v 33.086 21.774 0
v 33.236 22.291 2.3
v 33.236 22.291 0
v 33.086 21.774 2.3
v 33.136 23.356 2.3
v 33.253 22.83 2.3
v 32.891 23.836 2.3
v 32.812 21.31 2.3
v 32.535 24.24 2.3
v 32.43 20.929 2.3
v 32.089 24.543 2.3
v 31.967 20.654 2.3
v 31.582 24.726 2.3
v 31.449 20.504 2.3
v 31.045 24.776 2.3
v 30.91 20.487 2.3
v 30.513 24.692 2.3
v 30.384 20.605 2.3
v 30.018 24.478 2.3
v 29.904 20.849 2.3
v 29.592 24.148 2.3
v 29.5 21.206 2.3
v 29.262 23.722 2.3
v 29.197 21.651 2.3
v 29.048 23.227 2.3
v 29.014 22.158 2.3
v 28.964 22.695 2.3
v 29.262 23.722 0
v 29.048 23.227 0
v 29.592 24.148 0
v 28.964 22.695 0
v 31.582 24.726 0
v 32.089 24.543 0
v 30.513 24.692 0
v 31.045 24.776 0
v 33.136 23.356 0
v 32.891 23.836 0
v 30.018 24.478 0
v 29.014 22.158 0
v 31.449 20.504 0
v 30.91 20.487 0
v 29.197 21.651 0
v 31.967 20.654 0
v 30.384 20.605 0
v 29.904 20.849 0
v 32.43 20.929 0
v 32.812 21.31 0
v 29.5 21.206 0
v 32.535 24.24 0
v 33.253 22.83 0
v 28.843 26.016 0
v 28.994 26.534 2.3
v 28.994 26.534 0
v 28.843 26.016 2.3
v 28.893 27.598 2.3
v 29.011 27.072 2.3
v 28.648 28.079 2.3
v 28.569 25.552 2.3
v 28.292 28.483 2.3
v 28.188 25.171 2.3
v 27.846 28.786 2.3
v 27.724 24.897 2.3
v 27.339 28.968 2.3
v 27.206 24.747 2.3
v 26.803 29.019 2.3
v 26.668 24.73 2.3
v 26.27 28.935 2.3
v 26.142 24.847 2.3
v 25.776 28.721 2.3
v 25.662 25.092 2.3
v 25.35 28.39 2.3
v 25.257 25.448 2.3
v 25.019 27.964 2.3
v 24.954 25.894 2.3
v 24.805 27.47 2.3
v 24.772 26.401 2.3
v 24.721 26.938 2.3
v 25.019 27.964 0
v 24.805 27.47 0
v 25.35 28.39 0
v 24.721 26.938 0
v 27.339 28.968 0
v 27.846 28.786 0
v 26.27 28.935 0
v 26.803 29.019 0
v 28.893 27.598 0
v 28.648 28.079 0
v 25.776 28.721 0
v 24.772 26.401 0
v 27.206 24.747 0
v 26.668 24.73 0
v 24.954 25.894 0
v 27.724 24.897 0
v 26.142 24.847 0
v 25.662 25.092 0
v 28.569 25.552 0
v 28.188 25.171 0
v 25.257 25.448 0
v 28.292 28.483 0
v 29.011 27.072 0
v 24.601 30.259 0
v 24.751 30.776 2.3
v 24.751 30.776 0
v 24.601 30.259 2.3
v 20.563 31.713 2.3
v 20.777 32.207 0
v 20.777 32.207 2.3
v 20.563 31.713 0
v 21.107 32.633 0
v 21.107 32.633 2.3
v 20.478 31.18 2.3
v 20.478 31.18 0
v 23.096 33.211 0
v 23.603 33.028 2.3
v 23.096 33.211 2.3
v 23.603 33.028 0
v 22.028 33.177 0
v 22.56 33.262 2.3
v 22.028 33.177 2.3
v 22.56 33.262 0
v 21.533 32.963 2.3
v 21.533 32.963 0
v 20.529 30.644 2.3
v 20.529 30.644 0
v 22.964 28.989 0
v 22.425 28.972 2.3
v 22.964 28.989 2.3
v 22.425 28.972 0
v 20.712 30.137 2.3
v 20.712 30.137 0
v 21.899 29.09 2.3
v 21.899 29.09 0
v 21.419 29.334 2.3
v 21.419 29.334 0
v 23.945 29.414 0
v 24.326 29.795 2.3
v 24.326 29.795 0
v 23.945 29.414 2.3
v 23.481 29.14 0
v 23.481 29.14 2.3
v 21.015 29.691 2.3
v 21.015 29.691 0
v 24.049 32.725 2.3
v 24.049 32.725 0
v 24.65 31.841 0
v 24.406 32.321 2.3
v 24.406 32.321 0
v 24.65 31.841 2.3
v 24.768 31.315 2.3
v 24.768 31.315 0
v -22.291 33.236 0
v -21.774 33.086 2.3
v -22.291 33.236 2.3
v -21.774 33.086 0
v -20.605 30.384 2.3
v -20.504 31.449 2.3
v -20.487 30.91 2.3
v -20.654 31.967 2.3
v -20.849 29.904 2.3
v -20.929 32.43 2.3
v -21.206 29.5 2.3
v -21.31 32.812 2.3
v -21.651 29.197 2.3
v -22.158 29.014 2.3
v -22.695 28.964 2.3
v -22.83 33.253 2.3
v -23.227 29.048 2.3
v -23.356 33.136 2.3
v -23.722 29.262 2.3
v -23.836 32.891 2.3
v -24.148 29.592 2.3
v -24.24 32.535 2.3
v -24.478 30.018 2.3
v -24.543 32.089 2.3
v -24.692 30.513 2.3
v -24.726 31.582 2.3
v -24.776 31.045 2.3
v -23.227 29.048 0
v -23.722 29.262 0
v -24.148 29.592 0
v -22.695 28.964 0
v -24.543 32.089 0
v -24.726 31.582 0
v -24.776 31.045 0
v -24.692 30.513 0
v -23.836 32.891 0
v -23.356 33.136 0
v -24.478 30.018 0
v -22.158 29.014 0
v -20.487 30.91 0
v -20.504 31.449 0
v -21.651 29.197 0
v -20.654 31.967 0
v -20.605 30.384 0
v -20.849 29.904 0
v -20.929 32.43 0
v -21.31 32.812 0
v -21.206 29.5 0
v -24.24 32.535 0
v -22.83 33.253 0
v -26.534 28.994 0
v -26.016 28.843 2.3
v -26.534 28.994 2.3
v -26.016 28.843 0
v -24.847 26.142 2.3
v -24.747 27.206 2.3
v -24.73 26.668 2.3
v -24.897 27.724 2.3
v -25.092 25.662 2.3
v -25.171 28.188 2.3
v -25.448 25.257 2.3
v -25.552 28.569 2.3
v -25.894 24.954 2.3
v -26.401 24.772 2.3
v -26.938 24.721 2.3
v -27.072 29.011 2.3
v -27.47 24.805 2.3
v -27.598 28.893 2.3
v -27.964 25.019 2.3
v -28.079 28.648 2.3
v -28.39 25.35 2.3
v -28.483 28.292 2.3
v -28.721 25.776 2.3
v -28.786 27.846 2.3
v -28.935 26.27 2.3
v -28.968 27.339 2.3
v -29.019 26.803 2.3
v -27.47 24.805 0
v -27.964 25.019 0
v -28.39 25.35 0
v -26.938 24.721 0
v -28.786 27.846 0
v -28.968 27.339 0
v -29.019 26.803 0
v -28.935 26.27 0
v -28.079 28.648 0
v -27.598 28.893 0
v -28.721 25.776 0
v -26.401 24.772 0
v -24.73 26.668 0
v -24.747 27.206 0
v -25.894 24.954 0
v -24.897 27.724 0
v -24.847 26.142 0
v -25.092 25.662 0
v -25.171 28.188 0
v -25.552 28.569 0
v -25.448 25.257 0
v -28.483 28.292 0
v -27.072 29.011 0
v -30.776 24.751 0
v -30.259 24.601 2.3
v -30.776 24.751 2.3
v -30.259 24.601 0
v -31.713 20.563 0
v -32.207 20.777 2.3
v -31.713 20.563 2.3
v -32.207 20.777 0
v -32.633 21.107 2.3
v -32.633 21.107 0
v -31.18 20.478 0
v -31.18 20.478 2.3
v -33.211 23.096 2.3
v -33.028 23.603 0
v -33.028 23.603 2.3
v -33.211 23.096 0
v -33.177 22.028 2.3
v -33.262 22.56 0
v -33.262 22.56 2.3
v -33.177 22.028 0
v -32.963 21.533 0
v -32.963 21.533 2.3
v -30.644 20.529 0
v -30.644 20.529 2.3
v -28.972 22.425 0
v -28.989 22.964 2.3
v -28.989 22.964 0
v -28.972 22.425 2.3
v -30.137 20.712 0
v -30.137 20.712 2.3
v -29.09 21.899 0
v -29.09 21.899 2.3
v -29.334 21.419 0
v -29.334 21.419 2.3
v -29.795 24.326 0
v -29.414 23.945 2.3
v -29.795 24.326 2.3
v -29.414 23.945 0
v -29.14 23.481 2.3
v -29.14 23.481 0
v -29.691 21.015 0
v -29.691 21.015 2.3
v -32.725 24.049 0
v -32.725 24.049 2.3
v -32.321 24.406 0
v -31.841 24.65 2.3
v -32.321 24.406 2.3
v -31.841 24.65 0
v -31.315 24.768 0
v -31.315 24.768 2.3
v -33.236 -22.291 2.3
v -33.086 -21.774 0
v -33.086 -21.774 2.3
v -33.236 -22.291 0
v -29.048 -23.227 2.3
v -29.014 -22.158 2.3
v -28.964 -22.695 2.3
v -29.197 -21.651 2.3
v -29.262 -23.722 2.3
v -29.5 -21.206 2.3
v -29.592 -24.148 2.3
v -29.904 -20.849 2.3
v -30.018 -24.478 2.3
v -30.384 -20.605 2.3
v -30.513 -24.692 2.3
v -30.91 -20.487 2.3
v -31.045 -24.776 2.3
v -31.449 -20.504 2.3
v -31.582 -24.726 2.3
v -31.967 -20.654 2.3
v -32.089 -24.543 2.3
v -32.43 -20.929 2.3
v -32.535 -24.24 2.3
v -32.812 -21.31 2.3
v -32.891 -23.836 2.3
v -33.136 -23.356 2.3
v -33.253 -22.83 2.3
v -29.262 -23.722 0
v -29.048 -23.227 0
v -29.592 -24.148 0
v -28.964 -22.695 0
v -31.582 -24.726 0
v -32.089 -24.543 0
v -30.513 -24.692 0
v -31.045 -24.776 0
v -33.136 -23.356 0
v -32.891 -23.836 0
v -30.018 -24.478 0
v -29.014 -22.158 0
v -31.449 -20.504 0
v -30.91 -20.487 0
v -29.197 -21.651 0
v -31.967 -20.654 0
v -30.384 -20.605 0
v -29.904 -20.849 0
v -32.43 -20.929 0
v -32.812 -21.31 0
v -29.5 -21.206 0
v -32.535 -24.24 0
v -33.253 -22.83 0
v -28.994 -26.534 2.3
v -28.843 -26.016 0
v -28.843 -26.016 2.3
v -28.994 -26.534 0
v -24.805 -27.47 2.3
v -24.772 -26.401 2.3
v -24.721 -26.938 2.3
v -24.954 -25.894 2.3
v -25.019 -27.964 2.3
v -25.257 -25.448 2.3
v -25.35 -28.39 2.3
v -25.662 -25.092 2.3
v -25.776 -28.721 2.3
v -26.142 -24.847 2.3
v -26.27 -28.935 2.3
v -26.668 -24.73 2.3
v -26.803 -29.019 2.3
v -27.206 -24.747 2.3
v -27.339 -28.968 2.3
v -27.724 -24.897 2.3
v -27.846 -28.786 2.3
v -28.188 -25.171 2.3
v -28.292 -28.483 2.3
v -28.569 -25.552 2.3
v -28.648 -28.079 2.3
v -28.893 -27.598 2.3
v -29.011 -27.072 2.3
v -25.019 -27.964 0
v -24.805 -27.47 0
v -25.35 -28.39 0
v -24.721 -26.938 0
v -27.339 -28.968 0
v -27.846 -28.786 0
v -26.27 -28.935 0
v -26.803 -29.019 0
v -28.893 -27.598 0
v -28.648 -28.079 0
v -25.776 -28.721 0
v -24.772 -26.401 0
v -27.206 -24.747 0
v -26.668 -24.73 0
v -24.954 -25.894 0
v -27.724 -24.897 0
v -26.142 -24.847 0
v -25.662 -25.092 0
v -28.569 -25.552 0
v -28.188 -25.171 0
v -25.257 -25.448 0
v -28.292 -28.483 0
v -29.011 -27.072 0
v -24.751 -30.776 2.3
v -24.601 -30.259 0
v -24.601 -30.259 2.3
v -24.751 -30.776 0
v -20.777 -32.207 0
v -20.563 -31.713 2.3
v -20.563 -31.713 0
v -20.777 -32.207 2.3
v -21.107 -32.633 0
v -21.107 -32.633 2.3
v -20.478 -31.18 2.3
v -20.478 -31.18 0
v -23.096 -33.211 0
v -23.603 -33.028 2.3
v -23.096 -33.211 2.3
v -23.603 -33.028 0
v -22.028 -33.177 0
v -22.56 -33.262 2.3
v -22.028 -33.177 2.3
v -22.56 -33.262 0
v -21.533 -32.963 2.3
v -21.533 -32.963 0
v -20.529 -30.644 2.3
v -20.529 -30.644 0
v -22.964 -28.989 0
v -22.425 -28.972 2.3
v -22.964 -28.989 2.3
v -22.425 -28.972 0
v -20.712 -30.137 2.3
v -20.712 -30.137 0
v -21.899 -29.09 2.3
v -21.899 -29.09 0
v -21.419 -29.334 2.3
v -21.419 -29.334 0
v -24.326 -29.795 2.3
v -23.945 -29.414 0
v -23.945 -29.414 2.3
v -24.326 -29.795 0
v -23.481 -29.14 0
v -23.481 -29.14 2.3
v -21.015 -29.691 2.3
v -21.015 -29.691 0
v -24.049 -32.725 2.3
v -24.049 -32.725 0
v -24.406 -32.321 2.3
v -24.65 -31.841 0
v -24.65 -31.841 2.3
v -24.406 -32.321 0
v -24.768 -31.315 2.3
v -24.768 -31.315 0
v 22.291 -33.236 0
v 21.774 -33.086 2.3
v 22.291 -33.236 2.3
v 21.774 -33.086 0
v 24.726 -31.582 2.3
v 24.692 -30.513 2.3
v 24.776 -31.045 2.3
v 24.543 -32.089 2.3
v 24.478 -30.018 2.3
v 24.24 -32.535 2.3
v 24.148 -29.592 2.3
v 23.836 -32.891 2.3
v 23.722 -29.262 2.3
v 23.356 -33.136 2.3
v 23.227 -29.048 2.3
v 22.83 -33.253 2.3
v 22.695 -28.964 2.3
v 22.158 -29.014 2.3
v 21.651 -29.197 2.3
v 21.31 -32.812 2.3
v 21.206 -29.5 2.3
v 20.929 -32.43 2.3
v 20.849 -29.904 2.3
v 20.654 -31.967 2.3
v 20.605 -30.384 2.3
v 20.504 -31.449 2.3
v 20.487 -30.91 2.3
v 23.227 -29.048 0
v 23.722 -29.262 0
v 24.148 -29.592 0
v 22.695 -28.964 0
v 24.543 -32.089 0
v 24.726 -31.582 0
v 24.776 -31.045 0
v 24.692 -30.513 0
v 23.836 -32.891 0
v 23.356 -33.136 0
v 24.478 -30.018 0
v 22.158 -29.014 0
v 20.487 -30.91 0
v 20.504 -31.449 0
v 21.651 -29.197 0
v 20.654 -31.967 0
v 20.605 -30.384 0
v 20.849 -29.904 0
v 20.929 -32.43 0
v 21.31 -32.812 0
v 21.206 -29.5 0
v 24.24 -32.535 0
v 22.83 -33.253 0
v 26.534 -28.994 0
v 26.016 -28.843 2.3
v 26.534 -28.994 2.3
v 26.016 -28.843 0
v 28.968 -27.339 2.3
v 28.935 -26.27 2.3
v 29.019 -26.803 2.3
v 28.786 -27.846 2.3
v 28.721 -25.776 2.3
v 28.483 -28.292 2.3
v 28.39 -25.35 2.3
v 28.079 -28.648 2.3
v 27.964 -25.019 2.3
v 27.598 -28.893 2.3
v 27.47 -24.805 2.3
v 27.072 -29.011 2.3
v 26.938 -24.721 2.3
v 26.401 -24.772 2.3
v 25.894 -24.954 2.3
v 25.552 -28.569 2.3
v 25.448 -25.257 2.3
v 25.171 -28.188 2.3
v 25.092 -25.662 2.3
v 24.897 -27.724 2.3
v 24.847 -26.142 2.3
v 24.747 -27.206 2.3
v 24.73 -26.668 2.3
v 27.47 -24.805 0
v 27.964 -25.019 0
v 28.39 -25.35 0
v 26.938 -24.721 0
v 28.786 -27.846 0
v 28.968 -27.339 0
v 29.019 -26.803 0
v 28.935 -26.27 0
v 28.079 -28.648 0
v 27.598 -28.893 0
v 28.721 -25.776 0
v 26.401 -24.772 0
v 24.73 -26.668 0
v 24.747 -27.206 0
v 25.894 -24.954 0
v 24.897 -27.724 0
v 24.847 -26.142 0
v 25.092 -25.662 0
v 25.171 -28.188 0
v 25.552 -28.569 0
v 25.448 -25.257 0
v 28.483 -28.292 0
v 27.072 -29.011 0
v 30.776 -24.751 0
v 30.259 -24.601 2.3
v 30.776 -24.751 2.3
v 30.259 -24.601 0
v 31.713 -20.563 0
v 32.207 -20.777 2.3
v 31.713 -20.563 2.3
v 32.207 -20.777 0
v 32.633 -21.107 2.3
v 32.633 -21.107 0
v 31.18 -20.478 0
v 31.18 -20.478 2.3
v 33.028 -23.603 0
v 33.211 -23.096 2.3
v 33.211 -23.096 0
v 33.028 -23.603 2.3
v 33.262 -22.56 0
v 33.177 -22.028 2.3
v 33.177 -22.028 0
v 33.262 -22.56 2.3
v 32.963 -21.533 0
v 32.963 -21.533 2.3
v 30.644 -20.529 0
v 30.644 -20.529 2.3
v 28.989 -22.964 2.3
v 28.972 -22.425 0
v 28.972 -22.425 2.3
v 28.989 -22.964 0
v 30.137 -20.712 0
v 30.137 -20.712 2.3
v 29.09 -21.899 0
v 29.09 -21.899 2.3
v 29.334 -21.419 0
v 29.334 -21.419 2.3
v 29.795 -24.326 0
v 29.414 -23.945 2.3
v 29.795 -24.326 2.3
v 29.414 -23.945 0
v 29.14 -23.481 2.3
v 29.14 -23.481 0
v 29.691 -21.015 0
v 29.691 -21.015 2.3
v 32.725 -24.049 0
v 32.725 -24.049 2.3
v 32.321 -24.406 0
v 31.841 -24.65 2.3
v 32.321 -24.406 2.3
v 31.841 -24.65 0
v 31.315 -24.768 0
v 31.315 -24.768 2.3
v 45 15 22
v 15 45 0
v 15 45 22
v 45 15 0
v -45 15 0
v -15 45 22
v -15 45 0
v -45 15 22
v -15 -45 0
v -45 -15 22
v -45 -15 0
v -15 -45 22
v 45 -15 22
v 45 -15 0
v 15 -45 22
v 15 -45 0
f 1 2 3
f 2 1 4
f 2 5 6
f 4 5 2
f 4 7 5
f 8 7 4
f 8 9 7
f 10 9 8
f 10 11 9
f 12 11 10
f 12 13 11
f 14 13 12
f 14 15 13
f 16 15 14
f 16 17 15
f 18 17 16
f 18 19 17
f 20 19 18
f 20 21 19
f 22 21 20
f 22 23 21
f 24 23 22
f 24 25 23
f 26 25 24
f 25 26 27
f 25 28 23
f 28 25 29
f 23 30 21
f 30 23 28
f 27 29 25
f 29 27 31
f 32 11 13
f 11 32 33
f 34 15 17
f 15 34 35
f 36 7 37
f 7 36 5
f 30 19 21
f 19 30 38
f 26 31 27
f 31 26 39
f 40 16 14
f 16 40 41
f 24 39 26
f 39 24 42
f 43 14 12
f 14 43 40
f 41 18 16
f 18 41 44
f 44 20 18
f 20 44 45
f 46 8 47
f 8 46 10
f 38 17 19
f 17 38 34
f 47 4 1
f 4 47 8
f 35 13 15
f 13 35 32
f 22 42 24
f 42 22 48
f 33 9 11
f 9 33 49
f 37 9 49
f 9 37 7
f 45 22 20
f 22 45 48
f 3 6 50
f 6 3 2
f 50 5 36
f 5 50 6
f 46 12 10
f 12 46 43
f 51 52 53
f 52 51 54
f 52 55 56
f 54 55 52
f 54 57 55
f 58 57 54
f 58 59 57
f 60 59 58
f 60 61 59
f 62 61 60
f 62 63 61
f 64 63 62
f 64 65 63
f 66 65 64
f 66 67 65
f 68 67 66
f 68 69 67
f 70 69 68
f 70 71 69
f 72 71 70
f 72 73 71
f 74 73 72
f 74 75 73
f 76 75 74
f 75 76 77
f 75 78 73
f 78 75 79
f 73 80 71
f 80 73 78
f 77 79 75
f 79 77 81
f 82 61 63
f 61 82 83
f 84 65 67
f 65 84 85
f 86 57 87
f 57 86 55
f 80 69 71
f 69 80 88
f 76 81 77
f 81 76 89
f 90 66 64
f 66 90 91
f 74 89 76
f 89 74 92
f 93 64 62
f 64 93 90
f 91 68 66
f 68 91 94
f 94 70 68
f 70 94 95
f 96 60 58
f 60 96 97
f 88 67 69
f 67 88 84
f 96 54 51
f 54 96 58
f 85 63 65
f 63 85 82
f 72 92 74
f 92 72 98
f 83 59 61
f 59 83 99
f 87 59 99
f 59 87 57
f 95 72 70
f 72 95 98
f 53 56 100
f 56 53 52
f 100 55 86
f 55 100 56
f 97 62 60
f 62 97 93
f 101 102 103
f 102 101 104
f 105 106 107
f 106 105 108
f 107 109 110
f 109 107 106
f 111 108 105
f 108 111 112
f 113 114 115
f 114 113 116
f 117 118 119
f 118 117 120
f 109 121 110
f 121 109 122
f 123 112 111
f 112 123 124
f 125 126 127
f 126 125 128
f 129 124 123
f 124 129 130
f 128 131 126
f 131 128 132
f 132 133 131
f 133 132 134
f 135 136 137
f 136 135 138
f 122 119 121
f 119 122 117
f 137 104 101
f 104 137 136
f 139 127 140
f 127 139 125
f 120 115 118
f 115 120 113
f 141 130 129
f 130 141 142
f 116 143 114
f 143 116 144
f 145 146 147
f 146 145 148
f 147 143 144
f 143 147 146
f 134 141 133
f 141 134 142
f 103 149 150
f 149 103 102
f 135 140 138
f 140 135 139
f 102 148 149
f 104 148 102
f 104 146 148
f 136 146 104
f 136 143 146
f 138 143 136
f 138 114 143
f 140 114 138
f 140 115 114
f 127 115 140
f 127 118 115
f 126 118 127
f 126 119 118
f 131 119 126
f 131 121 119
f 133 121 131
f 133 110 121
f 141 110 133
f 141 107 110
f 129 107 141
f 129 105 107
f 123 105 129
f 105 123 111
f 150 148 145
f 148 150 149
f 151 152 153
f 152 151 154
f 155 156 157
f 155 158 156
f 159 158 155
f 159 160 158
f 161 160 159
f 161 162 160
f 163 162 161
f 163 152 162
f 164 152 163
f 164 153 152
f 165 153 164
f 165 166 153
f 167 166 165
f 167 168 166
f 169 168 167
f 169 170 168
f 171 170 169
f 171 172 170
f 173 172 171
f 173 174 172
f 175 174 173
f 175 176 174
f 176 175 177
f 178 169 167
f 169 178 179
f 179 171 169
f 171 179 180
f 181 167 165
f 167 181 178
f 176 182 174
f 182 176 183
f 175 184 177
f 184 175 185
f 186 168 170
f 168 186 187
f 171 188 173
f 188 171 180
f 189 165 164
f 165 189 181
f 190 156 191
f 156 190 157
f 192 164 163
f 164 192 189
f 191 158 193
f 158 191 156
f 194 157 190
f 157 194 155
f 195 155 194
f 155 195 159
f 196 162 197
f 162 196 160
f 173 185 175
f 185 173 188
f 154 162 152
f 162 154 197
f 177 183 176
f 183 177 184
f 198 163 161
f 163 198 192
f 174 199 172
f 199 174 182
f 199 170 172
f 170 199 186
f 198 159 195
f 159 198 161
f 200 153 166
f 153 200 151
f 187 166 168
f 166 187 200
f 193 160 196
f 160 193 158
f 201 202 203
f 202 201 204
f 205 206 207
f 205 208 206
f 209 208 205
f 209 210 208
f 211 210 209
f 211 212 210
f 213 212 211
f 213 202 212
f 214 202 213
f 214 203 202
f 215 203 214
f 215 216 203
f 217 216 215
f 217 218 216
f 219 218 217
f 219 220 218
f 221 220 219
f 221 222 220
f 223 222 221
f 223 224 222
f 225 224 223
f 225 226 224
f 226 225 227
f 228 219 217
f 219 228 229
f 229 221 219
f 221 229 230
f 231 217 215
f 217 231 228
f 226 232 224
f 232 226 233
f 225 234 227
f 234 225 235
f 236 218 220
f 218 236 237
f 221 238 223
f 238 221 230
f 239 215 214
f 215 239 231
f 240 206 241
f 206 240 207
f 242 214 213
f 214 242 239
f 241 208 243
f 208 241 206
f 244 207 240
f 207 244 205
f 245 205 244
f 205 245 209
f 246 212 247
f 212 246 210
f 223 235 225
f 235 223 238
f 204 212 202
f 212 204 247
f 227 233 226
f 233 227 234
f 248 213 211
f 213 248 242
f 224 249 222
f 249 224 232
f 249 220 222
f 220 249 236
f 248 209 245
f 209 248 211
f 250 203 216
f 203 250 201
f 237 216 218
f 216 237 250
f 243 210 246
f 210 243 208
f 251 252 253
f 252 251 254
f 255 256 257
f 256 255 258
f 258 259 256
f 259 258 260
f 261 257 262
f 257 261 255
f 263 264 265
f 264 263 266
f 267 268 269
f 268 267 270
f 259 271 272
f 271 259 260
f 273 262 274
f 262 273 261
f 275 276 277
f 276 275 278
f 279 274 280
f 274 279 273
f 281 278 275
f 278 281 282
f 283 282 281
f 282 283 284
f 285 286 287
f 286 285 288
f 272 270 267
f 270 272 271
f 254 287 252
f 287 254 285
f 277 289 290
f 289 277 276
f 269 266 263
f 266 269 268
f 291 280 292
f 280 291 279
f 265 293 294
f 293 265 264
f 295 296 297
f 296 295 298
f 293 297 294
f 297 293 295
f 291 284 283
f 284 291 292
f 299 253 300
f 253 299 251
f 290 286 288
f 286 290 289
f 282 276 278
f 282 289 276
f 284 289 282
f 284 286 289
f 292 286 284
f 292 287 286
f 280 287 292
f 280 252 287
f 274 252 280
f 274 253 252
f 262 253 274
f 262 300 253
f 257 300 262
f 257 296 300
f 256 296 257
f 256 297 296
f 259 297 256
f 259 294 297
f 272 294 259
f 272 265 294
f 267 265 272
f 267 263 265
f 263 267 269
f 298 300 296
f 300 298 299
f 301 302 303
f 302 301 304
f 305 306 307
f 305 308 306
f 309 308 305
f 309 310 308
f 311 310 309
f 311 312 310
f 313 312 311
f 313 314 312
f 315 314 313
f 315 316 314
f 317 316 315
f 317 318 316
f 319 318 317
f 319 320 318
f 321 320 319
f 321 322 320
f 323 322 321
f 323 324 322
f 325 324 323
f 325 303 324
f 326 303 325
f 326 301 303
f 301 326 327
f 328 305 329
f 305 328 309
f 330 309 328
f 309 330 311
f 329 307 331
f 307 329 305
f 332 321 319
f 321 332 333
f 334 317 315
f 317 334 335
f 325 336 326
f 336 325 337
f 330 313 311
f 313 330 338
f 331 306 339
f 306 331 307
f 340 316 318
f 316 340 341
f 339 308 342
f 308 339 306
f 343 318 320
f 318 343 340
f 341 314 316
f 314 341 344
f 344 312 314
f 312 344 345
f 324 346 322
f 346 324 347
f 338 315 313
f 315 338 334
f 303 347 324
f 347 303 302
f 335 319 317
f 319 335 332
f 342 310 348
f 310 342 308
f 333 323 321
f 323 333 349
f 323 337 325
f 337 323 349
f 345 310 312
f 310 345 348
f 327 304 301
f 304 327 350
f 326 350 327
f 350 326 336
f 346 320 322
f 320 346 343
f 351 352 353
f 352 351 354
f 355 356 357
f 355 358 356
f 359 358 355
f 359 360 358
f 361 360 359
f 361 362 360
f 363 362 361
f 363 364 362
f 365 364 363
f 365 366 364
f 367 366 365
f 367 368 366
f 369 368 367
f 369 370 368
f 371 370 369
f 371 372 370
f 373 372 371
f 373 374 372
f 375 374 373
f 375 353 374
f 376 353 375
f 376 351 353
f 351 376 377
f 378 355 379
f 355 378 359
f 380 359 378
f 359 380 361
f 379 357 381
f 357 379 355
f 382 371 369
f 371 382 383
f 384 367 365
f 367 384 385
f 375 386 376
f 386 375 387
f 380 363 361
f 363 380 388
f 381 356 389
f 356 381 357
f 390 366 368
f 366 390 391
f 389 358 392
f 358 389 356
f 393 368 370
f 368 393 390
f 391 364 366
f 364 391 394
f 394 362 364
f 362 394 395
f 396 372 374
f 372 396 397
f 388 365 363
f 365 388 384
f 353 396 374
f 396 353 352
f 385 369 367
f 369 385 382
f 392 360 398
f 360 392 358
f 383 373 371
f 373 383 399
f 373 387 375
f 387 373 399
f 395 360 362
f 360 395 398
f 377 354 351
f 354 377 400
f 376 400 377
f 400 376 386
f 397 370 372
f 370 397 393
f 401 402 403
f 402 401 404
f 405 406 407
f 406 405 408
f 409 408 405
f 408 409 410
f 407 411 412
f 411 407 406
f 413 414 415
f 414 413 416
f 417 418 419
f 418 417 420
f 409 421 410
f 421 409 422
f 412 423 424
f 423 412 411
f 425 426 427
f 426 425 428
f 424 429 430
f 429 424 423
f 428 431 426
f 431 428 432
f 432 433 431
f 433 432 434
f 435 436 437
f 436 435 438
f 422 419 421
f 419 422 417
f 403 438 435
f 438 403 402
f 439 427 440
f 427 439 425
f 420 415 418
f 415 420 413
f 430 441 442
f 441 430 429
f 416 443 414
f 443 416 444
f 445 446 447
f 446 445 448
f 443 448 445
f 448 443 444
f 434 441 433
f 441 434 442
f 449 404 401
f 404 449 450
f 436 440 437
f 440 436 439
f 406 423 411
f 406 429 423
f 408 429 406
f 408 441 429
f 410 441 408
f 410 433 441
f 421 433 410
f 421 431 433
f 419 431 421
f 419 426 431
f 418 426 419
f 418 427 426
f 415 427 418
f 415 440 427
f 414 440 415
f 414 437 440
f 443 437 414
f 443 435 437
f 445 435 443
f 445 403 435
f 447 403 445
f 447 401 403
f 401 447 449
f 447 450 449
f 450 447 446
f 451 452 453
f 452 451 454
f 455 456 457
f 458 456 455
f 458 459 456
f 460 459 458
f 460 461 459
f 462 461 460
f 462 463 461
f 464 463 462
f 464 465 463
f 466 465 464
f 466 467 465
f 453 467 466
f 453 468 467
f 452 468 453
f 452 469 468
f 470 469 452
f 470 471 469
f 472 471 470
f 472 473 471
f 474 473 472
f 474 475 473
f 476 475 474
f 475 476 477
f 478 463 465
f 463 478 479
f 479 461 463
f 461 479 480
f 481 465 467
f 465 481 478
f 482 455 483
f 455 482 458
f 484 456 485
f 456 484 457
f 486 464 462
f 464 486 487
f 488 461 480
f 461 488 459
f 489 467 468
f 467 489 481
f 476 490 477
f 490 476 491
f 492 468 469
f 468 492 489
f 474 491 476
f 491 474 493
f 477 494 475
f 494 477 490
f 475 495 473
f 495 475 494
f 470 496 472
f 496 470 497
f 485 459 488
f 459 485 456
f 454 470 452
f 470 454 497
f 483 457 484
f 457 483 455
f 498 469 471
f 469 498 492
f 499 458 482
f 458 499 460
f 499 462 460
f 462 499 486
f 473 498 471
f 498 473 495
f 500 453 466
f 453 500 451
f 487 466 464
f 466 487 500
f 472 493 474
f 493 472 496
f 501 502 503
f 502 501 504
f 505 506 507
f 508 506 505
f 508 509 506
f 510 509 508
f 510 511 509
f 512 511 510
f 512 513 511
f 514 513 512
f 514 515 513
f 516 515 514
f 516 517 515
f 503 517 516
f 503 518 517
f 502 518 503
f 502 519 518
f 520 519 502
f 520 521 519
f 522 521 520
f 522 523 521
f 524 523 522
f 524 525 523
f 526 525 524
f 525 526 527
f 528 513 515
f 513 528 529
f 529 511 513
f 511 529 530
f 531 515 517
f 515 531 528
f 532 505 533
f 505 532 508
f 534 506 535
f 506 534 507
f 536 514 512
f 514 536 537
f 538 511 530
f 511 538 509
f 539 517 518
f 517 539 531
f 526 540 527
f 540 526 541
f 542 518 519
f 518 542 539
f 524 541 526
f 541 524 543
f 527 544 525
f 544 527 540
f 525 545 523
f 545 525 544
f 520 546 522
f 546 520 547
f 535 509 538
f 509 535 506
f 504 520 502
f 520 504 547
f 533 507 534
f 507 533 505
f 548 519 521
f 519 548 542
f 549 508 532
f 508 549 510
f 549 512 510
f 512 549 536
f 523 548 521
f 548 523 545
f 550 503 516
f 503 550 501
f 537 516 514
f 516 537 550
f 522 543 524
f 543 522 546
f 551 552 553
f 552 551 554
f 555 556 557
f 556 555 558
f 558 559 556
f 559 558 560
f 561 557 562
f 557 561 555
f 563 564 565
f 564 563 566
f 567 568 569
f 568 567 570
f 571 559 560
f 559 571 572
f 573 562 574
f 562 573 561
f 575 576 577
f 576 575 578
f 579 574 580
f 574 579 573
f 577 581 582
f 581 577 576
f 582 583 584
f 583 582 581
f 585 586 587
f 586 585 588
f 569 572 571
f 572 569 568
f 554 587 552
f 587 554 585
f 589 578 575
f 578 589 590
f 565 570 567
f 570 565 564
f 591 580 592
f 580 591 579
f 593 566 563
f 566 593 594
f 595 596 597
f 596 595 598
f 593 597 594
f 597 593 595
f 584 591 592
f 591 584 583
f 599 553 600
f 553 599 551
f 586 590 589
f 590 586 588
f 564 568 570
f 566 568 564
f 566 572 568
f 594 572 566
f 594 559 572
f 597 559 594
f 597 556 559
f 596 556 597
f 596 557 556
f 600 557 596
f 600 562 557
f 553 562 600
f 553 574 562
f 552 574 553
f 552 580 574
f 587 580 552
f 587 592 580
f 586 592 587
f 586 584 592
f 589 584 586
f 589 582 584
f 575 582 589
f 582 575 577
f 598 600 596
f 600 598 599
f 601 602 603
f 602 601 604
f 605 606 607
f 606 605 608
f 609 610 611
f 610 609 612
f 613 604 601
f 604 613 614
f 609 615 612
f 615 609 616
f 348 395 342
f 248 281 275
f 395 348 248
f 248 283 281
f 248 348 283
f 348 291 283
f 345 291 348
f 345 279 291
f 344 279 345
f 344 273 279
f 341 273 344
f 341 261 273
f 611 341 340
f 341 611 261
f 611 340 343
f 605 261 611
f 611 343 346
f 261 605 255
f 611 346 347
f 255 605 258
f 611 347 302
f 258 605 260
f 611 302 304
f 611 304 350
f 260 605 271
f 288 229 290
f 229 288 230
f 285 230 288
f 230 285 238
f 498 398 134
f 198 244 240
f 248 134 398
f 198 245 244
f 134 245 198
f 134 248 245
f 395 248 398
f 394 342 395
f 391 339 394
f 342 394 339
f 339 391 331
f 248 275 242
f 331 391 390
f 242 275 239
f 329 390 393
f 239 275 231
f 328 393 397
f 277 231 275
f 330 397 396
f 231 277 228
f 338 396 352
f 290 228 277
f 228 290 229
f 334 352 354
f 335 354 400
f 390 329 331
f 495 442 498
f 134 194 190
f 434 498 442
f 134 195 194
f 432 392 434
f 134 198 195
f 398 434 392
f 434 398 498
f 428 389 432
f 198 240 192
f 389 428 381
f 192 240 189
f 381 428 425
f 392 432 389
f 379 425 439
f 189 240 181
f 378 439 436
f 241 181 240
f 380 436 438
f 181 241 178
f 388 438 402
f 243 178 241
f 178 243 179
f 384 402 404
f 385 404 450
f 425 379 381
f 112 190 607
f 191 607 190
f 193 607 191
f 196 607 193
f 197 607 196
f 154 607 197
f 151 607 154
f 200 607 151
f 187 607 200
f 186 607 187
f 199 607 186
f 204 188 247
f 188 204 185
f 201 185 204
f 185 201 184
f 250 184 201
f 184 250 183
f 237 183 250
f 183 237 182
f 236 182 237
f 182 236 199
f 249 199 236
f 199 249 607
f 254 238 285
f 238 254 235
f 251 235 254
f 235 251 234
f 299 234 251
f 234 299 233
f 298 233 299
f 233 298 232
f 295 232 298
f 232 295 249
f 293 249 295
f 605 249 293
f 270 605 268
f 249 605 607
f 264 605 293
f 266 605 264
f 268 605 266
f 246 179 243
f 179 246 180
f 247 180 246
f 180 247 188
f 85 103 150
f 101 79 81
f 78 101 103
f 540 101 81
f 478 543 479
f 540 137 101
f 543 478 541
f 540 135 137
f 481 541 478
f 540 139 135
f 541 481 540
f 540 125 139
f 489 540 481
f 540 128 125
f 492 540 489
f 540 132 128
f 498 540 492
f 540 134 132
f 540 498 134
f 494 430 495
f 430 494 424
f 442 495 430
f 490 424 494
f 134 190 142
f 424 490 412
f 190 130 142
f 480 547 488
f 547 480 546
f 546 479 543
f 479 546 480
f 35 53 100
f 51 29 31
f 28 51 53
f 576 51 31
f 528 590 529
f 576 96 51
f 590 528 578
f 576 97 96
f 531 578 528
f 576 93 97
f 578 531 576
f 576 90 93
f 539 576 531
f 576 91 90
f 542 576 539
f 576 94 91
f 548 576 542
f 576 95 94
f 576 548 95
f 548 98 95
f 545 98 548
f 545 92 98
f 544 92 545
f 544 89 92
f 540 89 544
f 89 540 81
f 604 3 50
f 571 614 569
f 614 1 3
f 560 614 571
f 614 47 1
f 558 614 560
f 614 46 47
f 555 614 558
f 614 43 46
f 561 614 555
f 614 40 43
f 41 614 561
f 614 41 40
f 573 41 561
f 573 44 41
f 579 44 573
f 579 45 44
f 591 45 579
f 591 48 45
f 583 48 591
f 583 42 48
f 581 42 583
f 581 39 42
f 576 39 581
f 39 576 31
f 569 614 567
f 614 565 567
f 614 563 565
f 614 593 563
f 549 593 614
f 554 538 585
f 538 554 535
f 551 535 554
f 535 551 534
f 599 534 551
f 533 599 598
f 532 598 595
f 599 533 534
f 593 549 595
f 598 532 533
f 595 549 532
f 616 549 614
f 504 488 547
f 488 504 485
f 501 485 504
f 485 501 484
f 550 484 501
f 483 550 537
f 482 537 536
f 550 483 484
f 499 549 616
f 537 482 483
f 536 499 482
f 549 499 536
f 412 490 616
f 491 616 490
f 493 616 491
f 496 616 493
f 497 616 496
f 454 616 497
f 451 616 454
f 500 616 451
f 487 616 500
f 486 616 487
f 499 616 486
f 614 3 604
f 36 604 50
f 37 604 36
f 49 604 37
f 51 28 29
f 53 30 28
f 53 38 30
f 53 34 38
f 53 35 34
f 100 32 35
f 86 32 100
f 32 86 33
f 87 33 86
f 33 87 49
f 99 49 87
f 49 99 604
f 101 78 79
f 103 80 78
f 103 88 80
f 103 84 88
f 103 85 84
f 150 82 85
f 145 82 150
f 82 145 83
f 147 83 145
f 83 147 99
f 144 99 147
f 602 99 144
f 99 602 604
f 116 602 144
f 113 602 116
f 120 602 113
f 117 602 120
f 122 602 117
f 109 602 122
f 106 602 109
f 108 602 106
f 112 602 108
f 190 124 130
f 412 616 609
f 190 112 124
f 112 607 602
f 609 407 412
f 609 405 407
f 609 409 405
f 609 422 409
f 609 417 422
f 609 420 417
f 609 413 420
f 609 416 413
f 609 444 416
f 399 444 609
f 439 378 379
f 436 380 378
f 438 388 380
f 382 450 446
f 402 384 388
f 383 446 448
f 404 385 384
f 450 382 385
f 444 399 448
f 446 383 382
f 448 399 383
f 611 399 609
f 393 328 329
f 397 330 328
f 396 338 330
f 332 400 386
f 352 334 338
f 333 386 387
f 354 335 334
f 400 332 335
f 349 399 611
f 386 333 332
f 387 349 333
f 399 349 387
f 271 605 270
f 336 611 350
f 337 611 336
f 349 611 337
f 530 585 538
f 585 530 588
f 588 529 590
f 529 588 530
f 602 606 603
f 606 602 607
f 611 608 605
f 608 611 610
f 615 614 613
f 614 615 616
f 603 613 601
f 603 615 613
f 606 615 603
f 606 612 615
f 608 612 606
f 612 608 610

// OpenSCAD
// file: ../../util/rounded.scad
// Do a rounded cube
module rounded(x=10, y=10, z=10, r=3, center=false) {
  if (center) {
    translate([-(x/2),-(y/2),0])
      rounded(x, y, z, r);
  } else {
    translate([r,r,0])
    minkowski() {
      cube([x-2*r,y-2*r,z/2]);
      cylinder(h=z/2, r=r);
    }
  }
}
// file: ../../util/hole3.scad
module hole3()
{
    cylinder(d=3.5, h=99, center=true);
}
// file: ../../util/repeat4.scad
module repeat4()
{
    for (r=[0:3])
    rotate([0,0,90*r])
    children();
}
// file: ../../util/hexapath.scad
// Follow an hexagonal path
module hexapath(X, Y, thickness, center=false)
{
    union() {
        linear_extrude(thickness, center=center)
            polygon(points=[
                    [X, Y], [X, -Y], 
                    [Y, -X], [-Y, -X],
                    [-X, -Y], [-X, Y],
                    [-Y, X], [Y, X], 
            ]);
    }
}
// file: ../../models/ollo.scad
// Diameter of plastic ollo holes
OlloHoles = 4.3;

// Width of Ollo "real" plastic
OlloWidth = 3;

// Distance between two ollo holes
OlloSpacing = 6;

// Do an Ollo hole on the part
module olloHole(depth=2.2)
{
    translate([0,0,-0.1])
      cylinder(depth+0.2, OlloHoles/2, OlloHoles/2);
}

// Do 3 ollo holes
module threeOllo(depth=2.2)
{
  for (xy=[[-OlloSpacing,0],[0,0],[OlloSpacing,0]]) {
    translate([xy[0], xy[1], 0])
    olloHole(depth);
  }
}

// Do a servo arm holes
module servoArm(depth=2.2)
{
    threeOllo(depth);
    rotate([0,0,90])
      threeOllo(depth);
}
// file: ../../parts/batfix.scad
include <../models/ollo.scad>;
use <../util/rounded.scad>;
use <../util/screws.scad>;

module batfix(thickness=2.2, cavity=13, height=10, screws=3.2,print=false)
{
	shift=9;
	holesSpacingW = OlloSpacing*7;
	holesSpacingH = OlloSpacing*2;
	R=print?[90,0,0]:[0,0,0];
	translate([-shift,0,height-2*thickness])
	rotate(R)
	difference() {
		union() {
			rounded(50, 20, thickness, 2, center=true);
			translate([shift,0,thickness-height/2])
			cube([cavity+2*thickness,20,height], center=true);
		}
		
		for (X=[-holesSpacingW/2, holesSpacingW/2])
		for (Y=[-holesSpacingH/2, holesSpacingH/2])
		translate([X,Y,-1])			
			cylinder(d=screws, h=thickness+2);
		
		translate([shift,0,0.01+2*thickness-height/2])
			cube([cavity,22,height], center=true);
		
		translate([shift,0,thickness-height])
			children();
	}
}

batfix();
// file: ../../parts/leg.scad
use <../models/ollo.scad>;
use <../util/rounded.scad>;

module leg(sizeA=60, sizeB=20, sizeC=20, sizeBottom=10,
        sizeTop=15, mode="arm", fixationAngle=0, thickness=2.2, print=false)
{
    xOffset = (mode == "side") ? -10 : 0;
    spacing = (mode == "side") ? 24 : 30;

    module legSide()
    {
        difference() {
            union() {
                translate([0,0,sizeA/2])
                    rotate([0,90,0]) {
                        cube([sizeA, 20, thickness], center=true);
                        if (mode == "side") {
                            translate([15-sizeA/2, 10, -thickness/2])
                                rotate([0,0,+fixationAngle])
                                rounded(25,10,thickness, center=true);
                        }
                    }
            }
            translate([-thickness, 0, sizeA-15]) {
                rotate([90,0,90]) {
                    if (mode == "arm") {
                        servoArm(2*thickness);
                    }
                }
                if (mode == "side") {
                    translate([0,10,0])
                        rotate([90,90-fixationAngle,90])
                        threeOllo(2*thickness);
                }
            }
        }
        translate([-thickness/2,0,sizeA]) {
            rotate([90,0,90])
                linear_extrude(thickness)
                polygon([[-10,0],[-1,sizeTop],[1,sizeTop],[10,0]]);
        }
    }

    module biais() {
        Dx = (spacing-sizeBottom)/2;
        Dy = sizeC;
        Dl = sqrt(pow(Dx,2)+pow(Dy,2));

        translate([-(spacing/2)-thickness,-10,-(sizeB+thickness/2)])
            rotate([0,atan2(Dy,Dx),0])
            cube([Dl,20,thickness]);
    }

    if (print) {
        translate([0,0,10-xOffset])
            rotate([90,0,0])
            leg(sizeA, sizeB, sizeC, sizeBottom,
                    sizeTop, mode, fixationAngle, thickness, false);
    } else {
        echo("[PART] leg");
        translate([0,xOffset,-sizeA+15]) {
            cube([spacing+thickness*2, 20, thickness], center=true);

            translate([spacing/2+thickness/2,0,0])
                legSide();
            translate([-(spacing/2+thickness/2),0,0])
                legSide();

            translate([0,0,-sizeB])
                cube([spacing+thickness*2, 20, thickness], center=true);
            translate([spacing/2+thickness/2,0,-sizeB/2])
                cube([thickness,20,sizeB], center=true);
            translate([-(spacing/2+thickness/2),0,-sizeB/2])
                cube([thickness,20,sizeB], center=true);

            translate([0,0,-(sizeB+sizeC)])
                cube([sizeBottom+thickness*2, 20, thickness], center=true);

            biais();
            mirror([1,0,0]) {
                biais();
            }
        }
    }
}

leg();
// file: ../../parts/side.scad
include <../models/ollo.scad>;
use <../util/rounded.scad>;

module side(size=40, holesToBorder=5, thickness=2.2, print=false) {
    if (print) {
        translate([0,-size+holesToBorder,0])
            side(size,holesToBorder,thickness,false);
    } else {
        echo("[PART] side");
        translate([0,size-holesToBorder,0]) {
            difference() {
                rounded(20, size*2, thickness, 5, true);
                for (y=[size-holesToBorder,	 -size+holesToBorder,
                        size-holesToBorder-3*OlloSpacing, -size+holesToBorder+3*OlloSpacing]) {
                    translate([0, y, 0])
                        threeOllo();
                }
            }
        }
    }
}

side();
// file: ../../parts/u.scad
use <../models/ollo.scad>;

module u(height=15, radius=8, thickness=2.2, screwsSpacing=10, screwsDiameter=2.6, screws=true, olloScrew=false, widthSize=15, print=false) {
    module Ubranch() {
        union() {  
            cylinder(thickness, 10, 10);
            translate([-10,0,0])
                cube([20, height, thickness]);
        }
    }

    module USide() {
        difference() {
            union() {
                Ubranch();
                translate([-10,height+radius-thickness,radius])
                    cube([20,thickness,widthSize-(radius-thickness)]);
                translate([-10,height,radius]) {
                    rotate([0,90,0]) {
                        difference() {
                            cylinder(20,radius,radius);
                            translate([0,0,-1])
                                cylinder(22,radius-thickness,radius-thickness);
                            translate([-10+radius-thickness,-10,-1])
                                cube([10,10,22]);
                            translate([-10,-20+radius-thickness,-1])
                                cube([10,20.01,22]);
                        }
                    }
                }
            }
            servoArm(depth=6);
        }
    }

    module UScrews() {
        for (x=[-screwsSpacing/2,screwsSpacing/2]) {
            for (y=[-screwsSpacing/2,screwsSpacing/2]) {
                rotate([270,0,0])
                    translate([x,y,0])
                    cylinder(d=screwsDiameter, h=100);
            }
        }
    }

	module UOllo() {
		rotate(-90, [1,0,0])
			servoArm(2*height);
	}

    if (print) {
        translate([0,0,10])
            rotate([0,90,0])
            u(height,radius,thickness,screwsSpacing,screwsDiameter,
                screws,olloScrew,widthSize,false);
    } else {
        echo("[PART] u");
        difference() {
            translate([0,0,-widthSize-thickness]) {
                USide();
                mirror([0,0,1]) translate([0,0,-2*thickness-2*widthSize])  
                    USide();
            }
            if (screws) {
                UScrews();
            }
            if (olloScrew) {
                UOllo();
            }
        }
    }
}

u();
// file: ../../parts/body.scad
use <../models/ollo.scad>;
use <../util/hexapath.scad>;
use <../util/repeat4.scad>;
use <../util/hole3.scad>;

$fn=25;

module body(thickness=2.2, type="top", print=false) {
    // The layout path
    X=45;
    Y=15;
    
    difference() {
        // Making the exernal path
        hexapath(X, Y, thickness=thickness);
        
        if (type == "top") {
            // Craving the board to make it accessible
            hexapath(X-8, Y-8, thickness=99, center=true);
            
            // Adding holes for the magnets
            repeat4()
            translate([41,0,0])
            hole3();
        } else if (type == "bottom") {
            // Adding holes for the XBoard
            repeat4()
            translate([35, 11.5, 0])
            hole3();
        }
        
        // Motors fixation
        repeat4()
        rotate([0,0,45])
        translate([38,0,0])
        rotate([0,0,90])
        threeOllo();
    }
    
}

body(type="top");
// file: ../../util/screws.scad
module screws(count=4, radius=5, size=3.3, thickness=2.2)
{
	for (screw=[1:count]) {
		rotate([0,0,screw*360/count])
		translate([radius,0,-1])
		cylinder(d=size, h=thickness+2);
	}
}

module squareScrews(w=10, h=10, size=3.3, thickness=2.2) {
	for (X=[-w/2, w/2])
	for (Y=[-h/2, h/2])
	translate([X,Y,-1])		
		cylinder(d=size, h=thickness+2);
}
// file: ../parts.scad
include <config.scad>;
use <../util/screws.scad>;
use <../parts/body.scad>;
use <../parts/u.scad>;
use <../parts/side.scad>;
use <../parts/leg.scad>;
use <../parts/batfix.scad>;

module metabot_colorize() {
    color(PartsColor)
        children();
}

module metabot_u(print=false) {
    metabot_colorize()
        u(UHeight, URadius, Thickness, UScrewsSpacing, UScrewsDiameter, print=print);
}

module metabot_leg(print=false) {
    metabot_colorize()
        leg(LegSizeA, LegSizeB, LegSizeC, LegSizeBottom,
                LegSizeTop, (MotorsPerLeg == 2 ? "side" : "arm"), L3Angle, Thickness, print=print);
}

module metabot_body_screws() {
	squareScrews(BodyScrewsW, BodyScrewsH, BodyScrewsSize, Thickness);
}

module metabot_body(print=false, top=false) {
    metabot_colorize()
        body(BodySize, Legs, Thickness, print=print)
		if (top && BodyScrews) {
			metabot_body_screws();
		}
}

module metabot_side(print=false) {
    metabot_colorize()
        side(SideSize, SideHolesToBorder, Thickness, print=print);
}

module metabot_batfix(print=false) {
	metabot_colorize()
    	batfix(print=print)
        	metabot_body_screws();
}
// file: ../config.scad
// Number of legs
Legs = 4;

// Size of the body
BodySize = 22;

// Number of motors per leg (2 or 3)
MotorsPerLeg = 3;

// Static L3 angle (used only if 2 motors per leg)
L3Angle = -5;

// Color of the parts, for rendering
PartsColor = [0.8, 0.8, 0.8];

// Thickness of parts (2.2 is good for Ollo rivets)
Thickness = 2.2;

// Sizes of the parts of the leg
// Ratio of leg parts
LegSize = 100;
LegSizeA = (0.60)*LegSize;
LegSizeB = (0.20)*LegSize;
LegSizeC = (0.20)*LegSize;

// Width of the bottom part of the leg
LegSizeBottom = 10;

// Size of the "top" part of the legs, in mm
LegSizeTop = 30;

// Body screws
BodyScrews = true;
BodyScrewsSize = 3.3;
BodyScrewsW = 7;
BodyScrewsH = 12;

// Motor dimensions
MotorWidth = 24;
MotorHeight = 36;
MotorDepth = 24;
MotorArmOffset = 9;

// U dimensions
UHeight = 15.2;
URadius = 8;
UWidth = 30+Thickness/2;
UTotalHeight = UHeight+URadius;
UScrewsSpacing = 10;
UScrewsDiameter= 3.3;

// Side dimensions
SideSize = 35;
SideHolesToBorder = 5;

// Defining the resolution
$fn=35;
// main file
include <../config.scad>;
use <../parts.scad>;

metabot_body(print=true, top=true);
